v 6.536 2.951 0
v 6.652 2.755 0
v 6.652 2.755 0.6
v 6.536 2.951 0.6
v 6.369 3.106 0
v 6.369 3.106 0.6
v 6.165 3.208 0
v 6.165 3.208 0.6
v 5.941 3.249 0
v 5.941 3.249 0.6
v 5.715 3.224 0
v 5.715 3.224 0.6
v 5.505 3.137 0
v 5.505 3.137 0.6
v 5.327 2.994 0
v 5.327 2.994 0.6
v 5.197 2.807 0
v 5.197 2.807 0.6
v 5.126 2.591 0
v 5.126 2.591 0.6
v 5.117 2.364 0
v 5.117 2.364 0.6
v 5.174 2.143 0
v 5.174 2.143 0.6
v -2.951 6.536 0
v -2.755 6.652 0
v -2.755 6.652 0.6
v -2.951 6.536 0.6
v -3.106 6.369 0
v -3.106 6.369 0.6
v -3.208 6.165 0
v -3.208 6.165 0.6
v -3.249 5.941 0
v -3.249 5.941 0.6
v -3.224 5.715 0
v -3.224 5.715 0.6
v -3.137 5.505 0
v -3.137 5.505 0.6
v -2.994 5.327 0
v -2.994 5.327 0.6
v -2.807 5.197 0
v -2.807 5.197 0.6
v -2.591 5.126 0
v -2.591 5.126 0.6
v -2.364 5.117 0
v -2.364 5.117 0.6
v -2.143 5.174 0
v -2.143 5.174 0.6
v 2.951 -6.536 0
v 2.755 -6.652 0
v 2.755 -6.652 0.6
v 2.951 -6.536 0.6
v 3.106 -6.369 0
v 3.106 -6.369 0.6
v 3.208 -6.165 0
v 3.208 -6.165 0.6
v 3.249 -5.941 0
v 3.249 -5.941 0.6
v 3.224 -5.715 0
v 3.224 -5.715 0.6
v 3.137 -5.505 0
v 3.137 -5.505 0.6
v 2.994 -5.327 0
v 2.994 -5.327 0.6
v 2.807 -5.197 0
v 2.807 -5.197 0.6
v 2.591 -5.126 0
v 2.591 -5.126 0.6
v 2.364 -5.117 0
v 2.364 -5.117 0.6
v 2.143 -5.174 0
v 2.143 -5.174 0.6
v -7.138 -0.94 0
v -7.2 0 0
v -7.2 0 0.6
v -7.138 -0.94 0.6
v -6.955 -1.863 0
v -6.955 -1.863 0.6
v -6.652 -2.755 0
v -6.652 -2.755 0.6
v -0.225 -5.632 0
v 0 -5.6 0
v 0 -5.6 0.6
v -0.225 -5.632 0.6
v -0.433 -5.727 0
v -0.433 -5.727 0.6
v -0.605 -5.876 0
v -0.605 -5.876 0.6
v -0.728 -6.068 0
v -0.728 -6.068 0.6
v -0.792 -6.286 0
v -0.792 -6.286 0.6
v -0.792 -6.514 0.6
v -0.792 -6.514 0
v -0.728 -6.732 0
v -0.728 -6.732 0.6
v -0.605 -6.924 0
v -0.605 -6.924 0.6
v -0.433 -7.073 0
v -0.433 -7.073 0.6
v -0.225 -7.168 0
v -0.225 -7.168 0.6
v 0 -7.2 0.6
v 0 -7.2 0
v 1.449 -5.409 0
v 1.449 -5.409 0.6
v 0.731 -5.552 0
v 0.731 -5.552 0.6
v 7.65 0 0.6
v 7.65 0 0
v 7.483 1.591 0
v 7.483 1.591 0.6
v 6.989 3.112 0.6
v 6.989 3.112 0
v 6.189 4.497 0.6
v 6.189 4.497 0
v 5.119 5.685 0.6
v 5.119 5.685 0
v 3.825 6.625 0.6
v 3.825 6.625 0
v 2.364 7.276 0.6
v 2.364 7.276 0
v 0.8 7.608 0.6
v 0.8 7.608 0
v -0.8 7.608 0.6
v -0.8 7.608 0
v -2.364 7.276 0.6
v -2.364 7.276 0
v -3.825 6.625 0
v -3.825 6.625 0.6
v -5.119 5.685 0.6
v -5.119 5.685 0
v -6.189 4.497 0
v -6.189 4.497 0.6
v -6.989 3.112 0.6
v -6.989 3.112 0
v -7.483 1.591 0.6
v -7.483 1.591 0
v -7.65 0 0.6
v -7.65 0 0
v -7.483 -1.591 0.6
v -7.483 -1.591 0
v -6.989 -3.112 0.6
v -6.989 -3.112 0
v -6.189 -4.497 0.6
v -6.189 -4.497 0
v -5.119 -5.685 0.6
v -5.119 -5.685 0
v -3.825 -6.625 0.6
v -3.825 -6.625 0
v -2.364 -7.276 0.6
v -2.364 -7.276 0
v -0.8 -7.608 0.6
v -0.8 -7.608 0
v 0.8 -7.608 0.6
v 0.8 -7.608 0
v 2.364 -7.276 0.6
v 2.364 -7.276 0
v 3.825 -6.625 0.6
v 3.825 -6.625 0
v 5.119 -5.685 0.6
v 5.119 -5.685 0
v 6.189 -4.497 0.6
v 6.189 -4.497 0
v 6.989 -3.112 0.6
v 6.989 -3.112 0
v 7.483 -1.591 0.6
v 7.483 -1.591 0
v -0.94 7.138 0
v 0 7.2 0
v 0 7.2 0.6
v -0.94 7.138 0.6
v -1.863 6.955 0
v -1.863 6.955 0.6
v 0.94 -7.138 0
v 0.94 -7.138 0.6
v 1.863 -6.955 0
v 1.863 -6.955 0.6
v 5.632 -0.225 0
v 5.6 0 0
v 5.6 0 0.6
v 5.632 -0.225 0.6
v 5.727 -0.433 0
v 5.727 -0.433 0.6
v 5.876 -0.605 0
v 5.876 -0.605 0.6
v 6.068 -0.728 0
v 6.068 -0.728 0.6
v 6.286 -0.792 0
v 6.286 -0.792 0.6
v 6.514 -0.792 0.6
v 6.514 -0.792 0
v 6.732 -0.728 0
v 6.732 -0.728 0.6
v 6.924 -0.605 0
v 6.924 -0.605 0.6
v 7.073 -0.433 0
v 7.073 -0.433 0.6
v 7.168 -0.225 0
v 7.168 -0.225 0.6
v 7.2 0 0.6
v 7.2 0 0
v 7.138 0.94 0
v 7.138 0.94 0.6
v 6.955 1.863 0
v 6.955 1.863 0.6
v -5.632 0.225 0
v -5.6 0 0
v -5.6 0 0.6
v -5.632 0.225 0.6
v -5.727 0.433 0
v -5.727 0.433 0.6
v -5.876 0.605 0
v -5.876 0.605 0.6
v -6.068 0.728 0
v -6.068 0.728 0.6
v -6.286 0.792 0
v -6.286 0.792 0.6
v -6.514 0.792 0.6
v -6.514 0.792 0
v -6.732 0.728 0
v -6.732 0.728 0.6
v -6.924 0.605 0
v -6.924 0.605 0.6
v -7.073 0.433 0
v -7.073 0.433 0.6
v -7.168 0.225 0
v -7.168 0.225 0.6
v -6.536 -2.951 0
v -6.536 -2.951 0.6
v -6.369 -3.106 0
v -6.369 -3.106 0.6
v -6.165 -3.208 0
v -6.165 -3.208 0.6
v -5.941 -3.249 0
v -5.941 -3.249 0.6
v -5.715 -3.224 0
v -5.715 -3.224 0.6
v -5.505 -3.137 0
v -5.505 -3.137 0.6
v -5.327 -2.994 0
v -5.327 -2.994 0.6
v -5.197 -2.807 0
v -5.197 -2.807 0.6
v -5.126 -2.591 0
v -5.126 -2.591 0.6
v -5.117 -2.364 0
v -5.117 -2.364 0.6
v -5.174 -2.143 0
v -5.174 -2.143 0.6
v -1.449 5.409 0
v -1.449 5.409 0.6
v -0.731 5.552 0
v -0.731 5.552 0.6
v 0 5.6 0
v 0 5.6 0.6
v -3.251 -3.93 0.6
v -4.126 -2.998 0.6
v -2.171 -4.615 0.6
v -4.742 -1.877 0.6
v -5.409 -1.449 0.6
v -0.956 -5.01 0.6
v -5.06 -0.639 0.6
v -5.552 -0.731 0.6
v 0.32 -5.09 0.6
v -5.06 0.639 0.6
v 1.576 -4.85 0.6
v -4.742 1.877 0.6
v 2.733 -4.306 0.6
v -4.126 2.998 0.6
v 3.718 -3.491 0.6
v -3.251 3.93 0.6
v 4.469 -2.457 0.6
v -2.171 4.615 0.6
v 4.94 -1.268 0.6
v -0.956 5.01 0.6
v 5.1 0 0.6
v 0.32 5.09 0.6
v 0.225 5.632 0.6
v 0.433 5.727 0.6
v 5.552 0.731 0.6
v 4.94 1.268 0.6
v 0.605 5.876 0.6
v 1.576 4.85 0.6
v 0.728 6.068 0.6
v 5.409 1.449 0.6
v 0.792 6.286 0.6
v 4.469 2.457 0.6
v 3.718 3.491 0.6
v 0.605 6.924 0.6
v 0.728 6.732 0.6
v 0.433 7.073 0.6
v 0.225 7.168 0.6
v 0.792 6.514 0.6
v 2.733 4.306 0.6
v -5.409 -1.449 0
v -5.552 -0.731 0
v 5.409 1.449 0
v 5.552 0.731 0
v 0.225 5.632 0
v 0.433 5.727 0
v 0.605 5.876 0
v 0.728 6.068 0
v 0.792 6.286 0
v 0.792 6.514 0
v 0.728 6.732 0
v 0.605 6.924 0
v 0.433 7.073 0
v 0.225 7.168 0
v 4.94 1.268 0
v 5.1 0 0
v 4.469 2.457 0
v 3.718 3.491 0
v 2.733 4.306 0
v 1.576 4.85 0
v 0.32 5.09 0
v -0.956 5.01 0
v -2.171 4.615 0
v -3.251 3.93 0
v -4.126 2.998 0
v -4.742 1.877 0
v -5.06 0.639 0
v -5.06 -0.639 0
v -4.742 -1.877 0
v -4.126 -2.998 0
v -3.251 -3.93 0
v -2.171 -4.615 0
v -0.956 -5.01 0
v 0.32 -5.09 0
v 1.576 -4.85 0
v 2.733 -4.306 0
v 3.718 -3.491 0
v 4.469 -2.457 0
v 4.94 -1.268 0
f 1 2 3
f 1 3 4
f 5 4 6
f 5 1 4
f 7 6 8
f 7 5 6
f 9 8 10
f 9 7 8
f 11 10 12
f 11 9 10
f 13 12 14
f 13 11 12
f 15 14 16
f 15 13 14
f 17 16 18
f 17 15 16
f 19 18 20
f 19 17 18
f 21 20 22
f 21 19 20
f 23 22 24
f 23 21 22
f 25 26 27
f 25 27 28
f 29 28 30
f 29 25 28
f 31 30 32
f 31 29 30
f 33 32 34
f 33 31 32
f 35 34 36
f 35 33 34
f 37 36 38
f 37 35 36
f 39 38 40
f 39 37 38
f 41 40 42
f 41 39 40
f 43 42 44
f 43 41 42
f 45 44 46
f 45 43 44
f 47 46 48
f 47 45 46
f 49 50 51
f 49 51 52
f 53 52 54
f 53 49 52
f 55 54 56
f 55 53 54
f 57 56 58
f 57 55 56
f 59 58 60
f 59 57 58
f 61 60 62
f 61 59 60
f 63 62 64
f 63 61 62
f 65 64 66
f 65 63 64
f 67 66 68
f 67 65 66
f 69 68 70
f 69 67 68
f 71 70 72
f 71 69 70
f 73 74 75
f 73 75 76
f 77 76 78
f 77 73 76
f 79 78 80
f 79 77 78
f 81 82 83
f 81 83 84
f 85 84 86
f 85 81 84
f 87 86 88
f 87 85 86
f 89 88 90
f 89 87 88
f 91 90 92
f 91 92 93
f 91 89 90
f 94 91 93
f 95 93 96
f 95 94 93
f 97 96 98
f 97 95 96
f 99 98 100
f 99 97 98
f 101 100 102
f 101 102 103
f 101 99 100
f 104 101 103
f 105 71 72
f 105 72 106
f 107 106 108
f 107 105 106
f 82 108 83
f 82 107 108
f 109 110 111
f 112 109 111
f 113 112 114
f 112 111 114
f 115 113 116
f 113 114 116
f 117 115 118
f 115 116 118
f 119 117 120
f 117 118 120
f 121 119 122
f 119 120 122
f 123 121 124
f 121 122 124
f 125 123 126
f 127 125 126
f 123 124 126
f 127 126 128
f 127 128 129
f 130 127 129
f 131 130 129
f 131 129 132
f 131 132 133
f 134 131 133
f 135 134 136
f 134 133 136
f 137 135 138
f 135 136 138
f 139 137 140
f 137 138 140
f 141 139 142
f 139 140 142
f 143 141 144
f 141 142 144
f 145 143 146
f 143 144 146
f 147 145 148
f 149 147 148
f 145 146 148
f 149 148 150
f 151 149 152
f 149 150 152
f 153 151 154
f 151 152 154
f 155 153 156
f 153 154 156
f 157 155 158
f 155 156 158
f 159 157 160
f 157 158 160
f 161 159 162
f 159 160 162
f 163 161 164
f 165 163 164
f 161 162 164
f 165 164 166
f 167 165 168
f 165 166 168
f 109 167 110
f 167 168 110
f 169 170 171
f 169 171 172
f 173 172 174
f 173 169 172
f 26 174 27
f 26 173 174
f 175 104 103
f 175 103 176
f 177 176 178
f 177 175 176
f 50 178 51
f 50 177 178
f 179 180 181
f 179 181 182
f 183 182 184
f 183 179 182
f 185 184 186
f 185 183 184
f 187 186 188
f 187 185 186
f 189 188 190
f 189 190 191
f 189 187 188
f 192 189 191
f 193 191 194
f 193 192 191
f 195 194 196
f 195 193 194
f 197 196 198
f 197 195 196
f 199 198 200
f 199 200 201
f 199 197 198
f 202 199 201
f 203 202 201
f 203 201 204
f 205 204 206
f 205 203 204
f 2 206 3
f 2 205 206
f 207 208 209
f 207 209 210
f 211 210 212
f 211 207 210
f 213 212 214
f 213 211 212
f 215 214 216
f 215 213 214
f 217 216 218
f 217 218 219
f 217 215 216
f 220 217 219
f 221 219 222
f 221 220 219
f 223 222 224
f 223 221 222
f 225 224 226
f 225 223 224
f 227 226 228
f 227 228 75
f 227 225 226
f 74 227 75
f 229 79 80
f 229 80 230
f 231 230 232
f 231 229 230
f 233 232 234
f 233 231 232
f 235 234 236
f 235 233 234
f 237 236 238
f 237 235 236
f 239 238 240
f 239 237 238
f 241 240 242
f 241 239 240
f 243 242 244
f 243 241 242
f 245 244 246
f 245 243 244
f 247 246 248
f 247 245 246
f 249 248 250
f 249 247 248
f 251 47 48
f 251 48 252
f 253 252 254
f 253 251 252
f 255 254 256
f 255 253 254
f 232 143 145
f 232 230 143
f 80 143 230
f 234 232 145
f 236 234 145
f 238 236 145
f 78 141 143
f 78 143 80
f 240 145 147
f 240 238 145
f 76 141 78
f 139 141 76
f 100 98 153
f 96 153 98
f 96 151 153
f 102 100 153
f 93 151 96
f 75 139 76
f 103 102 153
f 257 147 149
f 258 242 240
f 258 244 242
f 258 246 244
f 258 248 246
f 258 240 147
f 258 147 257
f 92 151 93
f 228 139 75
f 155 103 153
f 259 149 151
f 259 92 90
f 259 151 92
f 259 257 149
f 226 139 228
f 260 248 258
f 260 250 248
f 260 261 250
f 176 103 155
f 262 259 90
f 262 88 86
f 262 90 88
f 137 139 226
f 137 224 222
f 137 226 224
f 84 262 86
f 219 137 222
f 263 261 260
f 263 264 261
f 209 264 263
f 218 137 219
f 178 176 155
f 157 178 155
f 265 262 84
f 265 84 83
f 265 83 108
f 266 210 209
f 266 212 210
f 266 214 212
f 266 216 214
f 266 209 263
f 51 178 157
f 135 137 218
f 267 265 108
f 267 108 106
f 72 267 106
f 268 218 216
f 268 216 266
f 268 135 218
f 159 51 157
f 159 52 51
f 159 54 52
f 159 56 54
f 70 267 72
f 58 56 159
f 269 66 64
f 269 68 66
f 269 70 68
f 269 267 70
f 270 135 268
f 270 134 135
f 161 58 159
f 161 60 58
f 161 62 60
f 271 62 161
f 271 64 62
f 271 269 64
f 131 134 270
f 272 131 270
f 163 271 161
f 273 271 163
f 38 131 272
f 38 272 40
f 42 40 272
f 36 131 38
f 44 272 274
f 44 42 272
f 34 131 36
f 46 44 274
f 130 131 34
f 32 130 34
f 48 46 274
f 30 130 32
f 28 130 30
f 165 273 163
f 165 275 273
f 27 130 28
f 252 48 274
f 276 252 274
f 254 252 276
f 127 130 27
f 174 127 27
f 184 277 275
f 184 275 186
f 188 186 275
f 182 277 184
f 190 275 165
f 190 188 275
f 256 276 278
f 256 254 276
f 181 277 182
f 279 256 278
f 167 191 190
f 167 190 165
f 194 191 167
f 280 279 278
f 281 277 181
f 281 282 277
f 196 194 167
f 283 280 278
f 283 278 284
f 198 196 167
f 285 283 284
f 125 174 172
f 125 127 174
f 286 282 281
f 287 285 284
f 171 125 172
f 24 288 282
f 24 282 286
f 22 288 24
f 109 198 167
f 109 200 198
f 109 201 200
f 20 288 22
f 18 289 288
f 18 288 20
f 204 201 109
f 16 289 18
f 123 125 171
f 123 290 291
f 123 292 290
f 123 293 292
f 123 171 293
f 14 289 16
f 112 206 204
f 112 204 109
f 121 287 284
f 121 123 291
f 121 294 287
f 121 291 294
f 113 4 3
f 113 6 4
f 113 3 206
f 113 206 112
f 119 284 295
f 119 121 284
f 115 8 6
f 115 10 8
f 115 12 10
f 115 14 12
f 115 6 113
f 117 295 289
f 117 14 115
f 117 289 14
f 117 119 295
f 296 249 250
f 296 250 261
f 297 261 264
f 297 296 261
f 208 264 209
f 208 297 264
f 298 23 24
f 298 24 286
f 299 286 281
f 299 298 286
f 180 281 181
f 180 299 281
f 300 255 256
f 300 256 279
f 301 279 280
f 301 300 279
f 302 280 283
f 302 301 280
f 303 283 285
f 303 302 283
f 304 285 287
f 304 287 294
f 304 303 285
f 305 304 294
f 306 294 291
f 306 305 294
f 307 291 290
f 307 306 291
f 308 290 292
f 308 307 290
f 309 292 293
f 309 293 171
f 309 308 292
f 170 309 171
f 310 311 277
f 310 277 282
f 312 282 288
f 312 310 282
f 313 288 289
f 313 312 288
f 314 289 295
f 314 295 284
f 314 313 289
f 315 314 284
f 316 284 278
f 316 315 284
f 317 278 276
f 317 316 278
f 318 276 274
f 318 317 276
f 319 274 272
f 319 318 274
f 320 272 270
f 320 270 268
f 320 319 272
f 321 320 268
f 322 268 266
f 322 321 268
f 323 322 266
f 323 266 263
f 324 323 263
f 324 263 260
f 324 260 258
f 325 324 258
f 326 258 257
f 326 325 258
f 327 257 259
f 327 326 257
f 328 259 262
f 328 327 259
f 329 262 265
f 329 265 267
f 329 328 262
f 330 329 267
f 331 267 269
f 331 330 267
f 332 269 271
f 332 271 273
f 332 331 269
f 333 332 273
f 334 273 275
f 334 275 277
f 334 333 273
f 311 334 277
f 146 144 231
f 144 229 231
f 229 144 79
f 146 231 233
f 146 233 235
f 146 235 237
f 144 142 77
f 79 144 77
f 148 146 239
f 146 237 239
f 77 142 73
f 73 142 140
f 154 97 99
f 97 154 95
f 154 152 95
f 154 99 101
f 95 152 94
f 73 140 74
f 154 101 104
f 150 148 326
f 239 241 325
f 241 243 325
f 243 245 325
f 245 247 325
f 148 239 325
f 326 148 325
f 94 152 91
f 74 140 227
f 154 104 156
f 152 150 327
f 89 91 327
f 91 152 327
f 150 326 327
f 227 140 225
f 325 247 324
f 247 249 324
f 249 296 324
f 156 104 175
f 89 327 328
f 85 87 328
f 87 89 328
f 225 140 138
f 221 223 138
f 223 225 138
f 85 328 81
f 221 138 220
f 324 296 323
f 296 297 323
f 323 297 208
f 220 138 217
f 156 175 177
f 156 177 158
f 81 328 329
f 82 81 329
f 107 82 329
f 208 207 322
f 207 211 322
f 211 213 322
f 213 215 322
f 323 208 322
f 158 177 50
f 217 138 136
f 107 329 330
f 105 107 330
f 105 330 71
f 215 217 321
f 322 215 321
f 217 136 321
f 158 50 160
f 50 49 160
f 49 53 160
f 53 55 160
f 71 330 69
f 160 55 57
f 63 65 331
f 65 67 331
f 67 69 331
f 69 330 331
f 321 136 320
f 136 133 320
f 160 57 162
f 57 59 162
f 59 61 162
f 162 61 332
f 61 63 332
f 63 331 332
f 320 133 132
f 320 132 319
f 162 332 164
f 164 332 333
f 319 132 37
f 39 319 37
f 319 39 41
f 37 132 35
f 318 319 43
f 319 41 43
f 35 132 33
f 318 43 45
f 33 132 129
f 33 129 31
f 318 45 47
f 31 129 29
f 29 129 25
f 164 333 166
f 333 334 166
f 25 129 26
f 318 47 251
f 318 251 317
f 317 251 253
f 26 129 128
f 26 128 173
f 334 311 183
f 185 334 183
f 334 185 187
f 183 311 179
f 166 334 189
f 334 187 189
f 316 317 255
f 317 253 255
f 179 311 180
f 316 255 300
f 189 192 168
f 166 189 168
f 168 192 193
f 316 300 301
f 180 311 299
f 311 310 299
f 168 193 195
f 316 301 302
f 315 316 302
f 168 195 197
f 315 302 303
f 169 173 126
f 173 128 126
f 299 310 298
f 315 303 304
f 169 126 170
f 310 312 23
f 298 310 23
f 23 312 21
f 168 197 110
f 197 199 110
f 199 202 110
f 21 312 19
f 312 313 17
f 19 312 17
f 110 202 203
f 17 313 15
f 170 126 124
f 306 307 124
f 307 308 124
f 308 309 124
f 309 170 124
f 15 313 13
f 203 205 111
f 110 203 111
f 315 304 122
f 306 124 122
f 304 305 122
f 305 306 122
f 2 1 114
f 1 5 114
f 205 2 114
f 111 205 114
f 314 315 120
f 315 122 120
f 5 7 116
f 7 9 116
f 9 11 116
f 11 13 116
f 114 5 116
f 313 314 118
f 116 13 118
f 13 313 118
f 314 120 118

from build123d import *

# Parameters (mm, degrees)
SKETCH1_R           = 7.65
SKETCH1_R_2         = 5.1
BOSS_EXTRUDE1_DEPTH = 0.6


with BuildPart() as part:
    # Sketch1 → Boss-Extrude1 (new body)
    with BuildSketch(Plane.XY):
        Circle(SKETCH1_R)
        Circle(SKETCH1_R_2, mode=Mode.SUBTRACT)
        with BuildLine():
            ThreePointArc((0, 5.6), (0.8, 6.4), (0, 7.2))
            ThreePointArc((0, 7.2), (-1.404650319, 7.061654019), (-2.755320713, 6.651932634))
            ThreePointArc((-2.755320713, 6.651932634), (-3.188277593, 5.606682262), (-2.143027221, 5.173725382))
            ThreePointArc((-2.143027221, 5.173725382), (-1.092505803, 5.49239757), (0, 5.6))
        make_face(mode=Mode.SUBTRACT)
        with BuildLine():
            ThreePointArc((6.651932634, 2.755320713), (5.606682262, 3.188277593), (5.173725382, 2.143027221))
            ThreePointArc((5.173725382, 2.143027221), (5.49239757, 1.092505803), (5.6, 0))
            ThreePointArc((5.6, 0), (6.4, -0.8), (7.2, 0))
            ThreePointArc((7.2, 0), (7.061654019, 1.404650319), (6.651932634, 2.755320713))
        make_face(mode=Mode.SUBTRACT)
        with BuildLine():
            ThreePointArc((2.755320713, -6.651932634), (3.188277593, -5.606682262), (2.143027221, -5.173725382))
            ThreePointArc((2.143027221, -5.173725382), (1.092505803, -5.49239757), (0, -5.6))
            ThreePointArc((0, -5.6), (-0.8, -6.4), (0, -7.2))
            ThreePointArc((0, -7.2), (1.404650319, -7.061654019), (2.755320713, -6.651932634))
        make_face(mode=Mode.SUBTRACT)
        with BuildLine():
            ThreePointArc((-6.651932634, -2.755320713), (-5.606682262, -3.188277593), (-5.173725382, -2.143027221))
            ThreePointArc((-5.173725382, -2.143027221), (-5.49239757, -1.092505803), (-5.6, 0))
            ThreePointArc((-5.6, 0), (-6.4, 0.8), (-7.2, 0))
            ThreePointArc((-7.2, 0), (-7.061654019, -1.404650319), (-6.651932634, -2.755320713))
        make_face(mode=Mode.SUBTRACT)
    extrude(amount=BOSS_EXTRUDE1_DEPTH)


solid = part.part
